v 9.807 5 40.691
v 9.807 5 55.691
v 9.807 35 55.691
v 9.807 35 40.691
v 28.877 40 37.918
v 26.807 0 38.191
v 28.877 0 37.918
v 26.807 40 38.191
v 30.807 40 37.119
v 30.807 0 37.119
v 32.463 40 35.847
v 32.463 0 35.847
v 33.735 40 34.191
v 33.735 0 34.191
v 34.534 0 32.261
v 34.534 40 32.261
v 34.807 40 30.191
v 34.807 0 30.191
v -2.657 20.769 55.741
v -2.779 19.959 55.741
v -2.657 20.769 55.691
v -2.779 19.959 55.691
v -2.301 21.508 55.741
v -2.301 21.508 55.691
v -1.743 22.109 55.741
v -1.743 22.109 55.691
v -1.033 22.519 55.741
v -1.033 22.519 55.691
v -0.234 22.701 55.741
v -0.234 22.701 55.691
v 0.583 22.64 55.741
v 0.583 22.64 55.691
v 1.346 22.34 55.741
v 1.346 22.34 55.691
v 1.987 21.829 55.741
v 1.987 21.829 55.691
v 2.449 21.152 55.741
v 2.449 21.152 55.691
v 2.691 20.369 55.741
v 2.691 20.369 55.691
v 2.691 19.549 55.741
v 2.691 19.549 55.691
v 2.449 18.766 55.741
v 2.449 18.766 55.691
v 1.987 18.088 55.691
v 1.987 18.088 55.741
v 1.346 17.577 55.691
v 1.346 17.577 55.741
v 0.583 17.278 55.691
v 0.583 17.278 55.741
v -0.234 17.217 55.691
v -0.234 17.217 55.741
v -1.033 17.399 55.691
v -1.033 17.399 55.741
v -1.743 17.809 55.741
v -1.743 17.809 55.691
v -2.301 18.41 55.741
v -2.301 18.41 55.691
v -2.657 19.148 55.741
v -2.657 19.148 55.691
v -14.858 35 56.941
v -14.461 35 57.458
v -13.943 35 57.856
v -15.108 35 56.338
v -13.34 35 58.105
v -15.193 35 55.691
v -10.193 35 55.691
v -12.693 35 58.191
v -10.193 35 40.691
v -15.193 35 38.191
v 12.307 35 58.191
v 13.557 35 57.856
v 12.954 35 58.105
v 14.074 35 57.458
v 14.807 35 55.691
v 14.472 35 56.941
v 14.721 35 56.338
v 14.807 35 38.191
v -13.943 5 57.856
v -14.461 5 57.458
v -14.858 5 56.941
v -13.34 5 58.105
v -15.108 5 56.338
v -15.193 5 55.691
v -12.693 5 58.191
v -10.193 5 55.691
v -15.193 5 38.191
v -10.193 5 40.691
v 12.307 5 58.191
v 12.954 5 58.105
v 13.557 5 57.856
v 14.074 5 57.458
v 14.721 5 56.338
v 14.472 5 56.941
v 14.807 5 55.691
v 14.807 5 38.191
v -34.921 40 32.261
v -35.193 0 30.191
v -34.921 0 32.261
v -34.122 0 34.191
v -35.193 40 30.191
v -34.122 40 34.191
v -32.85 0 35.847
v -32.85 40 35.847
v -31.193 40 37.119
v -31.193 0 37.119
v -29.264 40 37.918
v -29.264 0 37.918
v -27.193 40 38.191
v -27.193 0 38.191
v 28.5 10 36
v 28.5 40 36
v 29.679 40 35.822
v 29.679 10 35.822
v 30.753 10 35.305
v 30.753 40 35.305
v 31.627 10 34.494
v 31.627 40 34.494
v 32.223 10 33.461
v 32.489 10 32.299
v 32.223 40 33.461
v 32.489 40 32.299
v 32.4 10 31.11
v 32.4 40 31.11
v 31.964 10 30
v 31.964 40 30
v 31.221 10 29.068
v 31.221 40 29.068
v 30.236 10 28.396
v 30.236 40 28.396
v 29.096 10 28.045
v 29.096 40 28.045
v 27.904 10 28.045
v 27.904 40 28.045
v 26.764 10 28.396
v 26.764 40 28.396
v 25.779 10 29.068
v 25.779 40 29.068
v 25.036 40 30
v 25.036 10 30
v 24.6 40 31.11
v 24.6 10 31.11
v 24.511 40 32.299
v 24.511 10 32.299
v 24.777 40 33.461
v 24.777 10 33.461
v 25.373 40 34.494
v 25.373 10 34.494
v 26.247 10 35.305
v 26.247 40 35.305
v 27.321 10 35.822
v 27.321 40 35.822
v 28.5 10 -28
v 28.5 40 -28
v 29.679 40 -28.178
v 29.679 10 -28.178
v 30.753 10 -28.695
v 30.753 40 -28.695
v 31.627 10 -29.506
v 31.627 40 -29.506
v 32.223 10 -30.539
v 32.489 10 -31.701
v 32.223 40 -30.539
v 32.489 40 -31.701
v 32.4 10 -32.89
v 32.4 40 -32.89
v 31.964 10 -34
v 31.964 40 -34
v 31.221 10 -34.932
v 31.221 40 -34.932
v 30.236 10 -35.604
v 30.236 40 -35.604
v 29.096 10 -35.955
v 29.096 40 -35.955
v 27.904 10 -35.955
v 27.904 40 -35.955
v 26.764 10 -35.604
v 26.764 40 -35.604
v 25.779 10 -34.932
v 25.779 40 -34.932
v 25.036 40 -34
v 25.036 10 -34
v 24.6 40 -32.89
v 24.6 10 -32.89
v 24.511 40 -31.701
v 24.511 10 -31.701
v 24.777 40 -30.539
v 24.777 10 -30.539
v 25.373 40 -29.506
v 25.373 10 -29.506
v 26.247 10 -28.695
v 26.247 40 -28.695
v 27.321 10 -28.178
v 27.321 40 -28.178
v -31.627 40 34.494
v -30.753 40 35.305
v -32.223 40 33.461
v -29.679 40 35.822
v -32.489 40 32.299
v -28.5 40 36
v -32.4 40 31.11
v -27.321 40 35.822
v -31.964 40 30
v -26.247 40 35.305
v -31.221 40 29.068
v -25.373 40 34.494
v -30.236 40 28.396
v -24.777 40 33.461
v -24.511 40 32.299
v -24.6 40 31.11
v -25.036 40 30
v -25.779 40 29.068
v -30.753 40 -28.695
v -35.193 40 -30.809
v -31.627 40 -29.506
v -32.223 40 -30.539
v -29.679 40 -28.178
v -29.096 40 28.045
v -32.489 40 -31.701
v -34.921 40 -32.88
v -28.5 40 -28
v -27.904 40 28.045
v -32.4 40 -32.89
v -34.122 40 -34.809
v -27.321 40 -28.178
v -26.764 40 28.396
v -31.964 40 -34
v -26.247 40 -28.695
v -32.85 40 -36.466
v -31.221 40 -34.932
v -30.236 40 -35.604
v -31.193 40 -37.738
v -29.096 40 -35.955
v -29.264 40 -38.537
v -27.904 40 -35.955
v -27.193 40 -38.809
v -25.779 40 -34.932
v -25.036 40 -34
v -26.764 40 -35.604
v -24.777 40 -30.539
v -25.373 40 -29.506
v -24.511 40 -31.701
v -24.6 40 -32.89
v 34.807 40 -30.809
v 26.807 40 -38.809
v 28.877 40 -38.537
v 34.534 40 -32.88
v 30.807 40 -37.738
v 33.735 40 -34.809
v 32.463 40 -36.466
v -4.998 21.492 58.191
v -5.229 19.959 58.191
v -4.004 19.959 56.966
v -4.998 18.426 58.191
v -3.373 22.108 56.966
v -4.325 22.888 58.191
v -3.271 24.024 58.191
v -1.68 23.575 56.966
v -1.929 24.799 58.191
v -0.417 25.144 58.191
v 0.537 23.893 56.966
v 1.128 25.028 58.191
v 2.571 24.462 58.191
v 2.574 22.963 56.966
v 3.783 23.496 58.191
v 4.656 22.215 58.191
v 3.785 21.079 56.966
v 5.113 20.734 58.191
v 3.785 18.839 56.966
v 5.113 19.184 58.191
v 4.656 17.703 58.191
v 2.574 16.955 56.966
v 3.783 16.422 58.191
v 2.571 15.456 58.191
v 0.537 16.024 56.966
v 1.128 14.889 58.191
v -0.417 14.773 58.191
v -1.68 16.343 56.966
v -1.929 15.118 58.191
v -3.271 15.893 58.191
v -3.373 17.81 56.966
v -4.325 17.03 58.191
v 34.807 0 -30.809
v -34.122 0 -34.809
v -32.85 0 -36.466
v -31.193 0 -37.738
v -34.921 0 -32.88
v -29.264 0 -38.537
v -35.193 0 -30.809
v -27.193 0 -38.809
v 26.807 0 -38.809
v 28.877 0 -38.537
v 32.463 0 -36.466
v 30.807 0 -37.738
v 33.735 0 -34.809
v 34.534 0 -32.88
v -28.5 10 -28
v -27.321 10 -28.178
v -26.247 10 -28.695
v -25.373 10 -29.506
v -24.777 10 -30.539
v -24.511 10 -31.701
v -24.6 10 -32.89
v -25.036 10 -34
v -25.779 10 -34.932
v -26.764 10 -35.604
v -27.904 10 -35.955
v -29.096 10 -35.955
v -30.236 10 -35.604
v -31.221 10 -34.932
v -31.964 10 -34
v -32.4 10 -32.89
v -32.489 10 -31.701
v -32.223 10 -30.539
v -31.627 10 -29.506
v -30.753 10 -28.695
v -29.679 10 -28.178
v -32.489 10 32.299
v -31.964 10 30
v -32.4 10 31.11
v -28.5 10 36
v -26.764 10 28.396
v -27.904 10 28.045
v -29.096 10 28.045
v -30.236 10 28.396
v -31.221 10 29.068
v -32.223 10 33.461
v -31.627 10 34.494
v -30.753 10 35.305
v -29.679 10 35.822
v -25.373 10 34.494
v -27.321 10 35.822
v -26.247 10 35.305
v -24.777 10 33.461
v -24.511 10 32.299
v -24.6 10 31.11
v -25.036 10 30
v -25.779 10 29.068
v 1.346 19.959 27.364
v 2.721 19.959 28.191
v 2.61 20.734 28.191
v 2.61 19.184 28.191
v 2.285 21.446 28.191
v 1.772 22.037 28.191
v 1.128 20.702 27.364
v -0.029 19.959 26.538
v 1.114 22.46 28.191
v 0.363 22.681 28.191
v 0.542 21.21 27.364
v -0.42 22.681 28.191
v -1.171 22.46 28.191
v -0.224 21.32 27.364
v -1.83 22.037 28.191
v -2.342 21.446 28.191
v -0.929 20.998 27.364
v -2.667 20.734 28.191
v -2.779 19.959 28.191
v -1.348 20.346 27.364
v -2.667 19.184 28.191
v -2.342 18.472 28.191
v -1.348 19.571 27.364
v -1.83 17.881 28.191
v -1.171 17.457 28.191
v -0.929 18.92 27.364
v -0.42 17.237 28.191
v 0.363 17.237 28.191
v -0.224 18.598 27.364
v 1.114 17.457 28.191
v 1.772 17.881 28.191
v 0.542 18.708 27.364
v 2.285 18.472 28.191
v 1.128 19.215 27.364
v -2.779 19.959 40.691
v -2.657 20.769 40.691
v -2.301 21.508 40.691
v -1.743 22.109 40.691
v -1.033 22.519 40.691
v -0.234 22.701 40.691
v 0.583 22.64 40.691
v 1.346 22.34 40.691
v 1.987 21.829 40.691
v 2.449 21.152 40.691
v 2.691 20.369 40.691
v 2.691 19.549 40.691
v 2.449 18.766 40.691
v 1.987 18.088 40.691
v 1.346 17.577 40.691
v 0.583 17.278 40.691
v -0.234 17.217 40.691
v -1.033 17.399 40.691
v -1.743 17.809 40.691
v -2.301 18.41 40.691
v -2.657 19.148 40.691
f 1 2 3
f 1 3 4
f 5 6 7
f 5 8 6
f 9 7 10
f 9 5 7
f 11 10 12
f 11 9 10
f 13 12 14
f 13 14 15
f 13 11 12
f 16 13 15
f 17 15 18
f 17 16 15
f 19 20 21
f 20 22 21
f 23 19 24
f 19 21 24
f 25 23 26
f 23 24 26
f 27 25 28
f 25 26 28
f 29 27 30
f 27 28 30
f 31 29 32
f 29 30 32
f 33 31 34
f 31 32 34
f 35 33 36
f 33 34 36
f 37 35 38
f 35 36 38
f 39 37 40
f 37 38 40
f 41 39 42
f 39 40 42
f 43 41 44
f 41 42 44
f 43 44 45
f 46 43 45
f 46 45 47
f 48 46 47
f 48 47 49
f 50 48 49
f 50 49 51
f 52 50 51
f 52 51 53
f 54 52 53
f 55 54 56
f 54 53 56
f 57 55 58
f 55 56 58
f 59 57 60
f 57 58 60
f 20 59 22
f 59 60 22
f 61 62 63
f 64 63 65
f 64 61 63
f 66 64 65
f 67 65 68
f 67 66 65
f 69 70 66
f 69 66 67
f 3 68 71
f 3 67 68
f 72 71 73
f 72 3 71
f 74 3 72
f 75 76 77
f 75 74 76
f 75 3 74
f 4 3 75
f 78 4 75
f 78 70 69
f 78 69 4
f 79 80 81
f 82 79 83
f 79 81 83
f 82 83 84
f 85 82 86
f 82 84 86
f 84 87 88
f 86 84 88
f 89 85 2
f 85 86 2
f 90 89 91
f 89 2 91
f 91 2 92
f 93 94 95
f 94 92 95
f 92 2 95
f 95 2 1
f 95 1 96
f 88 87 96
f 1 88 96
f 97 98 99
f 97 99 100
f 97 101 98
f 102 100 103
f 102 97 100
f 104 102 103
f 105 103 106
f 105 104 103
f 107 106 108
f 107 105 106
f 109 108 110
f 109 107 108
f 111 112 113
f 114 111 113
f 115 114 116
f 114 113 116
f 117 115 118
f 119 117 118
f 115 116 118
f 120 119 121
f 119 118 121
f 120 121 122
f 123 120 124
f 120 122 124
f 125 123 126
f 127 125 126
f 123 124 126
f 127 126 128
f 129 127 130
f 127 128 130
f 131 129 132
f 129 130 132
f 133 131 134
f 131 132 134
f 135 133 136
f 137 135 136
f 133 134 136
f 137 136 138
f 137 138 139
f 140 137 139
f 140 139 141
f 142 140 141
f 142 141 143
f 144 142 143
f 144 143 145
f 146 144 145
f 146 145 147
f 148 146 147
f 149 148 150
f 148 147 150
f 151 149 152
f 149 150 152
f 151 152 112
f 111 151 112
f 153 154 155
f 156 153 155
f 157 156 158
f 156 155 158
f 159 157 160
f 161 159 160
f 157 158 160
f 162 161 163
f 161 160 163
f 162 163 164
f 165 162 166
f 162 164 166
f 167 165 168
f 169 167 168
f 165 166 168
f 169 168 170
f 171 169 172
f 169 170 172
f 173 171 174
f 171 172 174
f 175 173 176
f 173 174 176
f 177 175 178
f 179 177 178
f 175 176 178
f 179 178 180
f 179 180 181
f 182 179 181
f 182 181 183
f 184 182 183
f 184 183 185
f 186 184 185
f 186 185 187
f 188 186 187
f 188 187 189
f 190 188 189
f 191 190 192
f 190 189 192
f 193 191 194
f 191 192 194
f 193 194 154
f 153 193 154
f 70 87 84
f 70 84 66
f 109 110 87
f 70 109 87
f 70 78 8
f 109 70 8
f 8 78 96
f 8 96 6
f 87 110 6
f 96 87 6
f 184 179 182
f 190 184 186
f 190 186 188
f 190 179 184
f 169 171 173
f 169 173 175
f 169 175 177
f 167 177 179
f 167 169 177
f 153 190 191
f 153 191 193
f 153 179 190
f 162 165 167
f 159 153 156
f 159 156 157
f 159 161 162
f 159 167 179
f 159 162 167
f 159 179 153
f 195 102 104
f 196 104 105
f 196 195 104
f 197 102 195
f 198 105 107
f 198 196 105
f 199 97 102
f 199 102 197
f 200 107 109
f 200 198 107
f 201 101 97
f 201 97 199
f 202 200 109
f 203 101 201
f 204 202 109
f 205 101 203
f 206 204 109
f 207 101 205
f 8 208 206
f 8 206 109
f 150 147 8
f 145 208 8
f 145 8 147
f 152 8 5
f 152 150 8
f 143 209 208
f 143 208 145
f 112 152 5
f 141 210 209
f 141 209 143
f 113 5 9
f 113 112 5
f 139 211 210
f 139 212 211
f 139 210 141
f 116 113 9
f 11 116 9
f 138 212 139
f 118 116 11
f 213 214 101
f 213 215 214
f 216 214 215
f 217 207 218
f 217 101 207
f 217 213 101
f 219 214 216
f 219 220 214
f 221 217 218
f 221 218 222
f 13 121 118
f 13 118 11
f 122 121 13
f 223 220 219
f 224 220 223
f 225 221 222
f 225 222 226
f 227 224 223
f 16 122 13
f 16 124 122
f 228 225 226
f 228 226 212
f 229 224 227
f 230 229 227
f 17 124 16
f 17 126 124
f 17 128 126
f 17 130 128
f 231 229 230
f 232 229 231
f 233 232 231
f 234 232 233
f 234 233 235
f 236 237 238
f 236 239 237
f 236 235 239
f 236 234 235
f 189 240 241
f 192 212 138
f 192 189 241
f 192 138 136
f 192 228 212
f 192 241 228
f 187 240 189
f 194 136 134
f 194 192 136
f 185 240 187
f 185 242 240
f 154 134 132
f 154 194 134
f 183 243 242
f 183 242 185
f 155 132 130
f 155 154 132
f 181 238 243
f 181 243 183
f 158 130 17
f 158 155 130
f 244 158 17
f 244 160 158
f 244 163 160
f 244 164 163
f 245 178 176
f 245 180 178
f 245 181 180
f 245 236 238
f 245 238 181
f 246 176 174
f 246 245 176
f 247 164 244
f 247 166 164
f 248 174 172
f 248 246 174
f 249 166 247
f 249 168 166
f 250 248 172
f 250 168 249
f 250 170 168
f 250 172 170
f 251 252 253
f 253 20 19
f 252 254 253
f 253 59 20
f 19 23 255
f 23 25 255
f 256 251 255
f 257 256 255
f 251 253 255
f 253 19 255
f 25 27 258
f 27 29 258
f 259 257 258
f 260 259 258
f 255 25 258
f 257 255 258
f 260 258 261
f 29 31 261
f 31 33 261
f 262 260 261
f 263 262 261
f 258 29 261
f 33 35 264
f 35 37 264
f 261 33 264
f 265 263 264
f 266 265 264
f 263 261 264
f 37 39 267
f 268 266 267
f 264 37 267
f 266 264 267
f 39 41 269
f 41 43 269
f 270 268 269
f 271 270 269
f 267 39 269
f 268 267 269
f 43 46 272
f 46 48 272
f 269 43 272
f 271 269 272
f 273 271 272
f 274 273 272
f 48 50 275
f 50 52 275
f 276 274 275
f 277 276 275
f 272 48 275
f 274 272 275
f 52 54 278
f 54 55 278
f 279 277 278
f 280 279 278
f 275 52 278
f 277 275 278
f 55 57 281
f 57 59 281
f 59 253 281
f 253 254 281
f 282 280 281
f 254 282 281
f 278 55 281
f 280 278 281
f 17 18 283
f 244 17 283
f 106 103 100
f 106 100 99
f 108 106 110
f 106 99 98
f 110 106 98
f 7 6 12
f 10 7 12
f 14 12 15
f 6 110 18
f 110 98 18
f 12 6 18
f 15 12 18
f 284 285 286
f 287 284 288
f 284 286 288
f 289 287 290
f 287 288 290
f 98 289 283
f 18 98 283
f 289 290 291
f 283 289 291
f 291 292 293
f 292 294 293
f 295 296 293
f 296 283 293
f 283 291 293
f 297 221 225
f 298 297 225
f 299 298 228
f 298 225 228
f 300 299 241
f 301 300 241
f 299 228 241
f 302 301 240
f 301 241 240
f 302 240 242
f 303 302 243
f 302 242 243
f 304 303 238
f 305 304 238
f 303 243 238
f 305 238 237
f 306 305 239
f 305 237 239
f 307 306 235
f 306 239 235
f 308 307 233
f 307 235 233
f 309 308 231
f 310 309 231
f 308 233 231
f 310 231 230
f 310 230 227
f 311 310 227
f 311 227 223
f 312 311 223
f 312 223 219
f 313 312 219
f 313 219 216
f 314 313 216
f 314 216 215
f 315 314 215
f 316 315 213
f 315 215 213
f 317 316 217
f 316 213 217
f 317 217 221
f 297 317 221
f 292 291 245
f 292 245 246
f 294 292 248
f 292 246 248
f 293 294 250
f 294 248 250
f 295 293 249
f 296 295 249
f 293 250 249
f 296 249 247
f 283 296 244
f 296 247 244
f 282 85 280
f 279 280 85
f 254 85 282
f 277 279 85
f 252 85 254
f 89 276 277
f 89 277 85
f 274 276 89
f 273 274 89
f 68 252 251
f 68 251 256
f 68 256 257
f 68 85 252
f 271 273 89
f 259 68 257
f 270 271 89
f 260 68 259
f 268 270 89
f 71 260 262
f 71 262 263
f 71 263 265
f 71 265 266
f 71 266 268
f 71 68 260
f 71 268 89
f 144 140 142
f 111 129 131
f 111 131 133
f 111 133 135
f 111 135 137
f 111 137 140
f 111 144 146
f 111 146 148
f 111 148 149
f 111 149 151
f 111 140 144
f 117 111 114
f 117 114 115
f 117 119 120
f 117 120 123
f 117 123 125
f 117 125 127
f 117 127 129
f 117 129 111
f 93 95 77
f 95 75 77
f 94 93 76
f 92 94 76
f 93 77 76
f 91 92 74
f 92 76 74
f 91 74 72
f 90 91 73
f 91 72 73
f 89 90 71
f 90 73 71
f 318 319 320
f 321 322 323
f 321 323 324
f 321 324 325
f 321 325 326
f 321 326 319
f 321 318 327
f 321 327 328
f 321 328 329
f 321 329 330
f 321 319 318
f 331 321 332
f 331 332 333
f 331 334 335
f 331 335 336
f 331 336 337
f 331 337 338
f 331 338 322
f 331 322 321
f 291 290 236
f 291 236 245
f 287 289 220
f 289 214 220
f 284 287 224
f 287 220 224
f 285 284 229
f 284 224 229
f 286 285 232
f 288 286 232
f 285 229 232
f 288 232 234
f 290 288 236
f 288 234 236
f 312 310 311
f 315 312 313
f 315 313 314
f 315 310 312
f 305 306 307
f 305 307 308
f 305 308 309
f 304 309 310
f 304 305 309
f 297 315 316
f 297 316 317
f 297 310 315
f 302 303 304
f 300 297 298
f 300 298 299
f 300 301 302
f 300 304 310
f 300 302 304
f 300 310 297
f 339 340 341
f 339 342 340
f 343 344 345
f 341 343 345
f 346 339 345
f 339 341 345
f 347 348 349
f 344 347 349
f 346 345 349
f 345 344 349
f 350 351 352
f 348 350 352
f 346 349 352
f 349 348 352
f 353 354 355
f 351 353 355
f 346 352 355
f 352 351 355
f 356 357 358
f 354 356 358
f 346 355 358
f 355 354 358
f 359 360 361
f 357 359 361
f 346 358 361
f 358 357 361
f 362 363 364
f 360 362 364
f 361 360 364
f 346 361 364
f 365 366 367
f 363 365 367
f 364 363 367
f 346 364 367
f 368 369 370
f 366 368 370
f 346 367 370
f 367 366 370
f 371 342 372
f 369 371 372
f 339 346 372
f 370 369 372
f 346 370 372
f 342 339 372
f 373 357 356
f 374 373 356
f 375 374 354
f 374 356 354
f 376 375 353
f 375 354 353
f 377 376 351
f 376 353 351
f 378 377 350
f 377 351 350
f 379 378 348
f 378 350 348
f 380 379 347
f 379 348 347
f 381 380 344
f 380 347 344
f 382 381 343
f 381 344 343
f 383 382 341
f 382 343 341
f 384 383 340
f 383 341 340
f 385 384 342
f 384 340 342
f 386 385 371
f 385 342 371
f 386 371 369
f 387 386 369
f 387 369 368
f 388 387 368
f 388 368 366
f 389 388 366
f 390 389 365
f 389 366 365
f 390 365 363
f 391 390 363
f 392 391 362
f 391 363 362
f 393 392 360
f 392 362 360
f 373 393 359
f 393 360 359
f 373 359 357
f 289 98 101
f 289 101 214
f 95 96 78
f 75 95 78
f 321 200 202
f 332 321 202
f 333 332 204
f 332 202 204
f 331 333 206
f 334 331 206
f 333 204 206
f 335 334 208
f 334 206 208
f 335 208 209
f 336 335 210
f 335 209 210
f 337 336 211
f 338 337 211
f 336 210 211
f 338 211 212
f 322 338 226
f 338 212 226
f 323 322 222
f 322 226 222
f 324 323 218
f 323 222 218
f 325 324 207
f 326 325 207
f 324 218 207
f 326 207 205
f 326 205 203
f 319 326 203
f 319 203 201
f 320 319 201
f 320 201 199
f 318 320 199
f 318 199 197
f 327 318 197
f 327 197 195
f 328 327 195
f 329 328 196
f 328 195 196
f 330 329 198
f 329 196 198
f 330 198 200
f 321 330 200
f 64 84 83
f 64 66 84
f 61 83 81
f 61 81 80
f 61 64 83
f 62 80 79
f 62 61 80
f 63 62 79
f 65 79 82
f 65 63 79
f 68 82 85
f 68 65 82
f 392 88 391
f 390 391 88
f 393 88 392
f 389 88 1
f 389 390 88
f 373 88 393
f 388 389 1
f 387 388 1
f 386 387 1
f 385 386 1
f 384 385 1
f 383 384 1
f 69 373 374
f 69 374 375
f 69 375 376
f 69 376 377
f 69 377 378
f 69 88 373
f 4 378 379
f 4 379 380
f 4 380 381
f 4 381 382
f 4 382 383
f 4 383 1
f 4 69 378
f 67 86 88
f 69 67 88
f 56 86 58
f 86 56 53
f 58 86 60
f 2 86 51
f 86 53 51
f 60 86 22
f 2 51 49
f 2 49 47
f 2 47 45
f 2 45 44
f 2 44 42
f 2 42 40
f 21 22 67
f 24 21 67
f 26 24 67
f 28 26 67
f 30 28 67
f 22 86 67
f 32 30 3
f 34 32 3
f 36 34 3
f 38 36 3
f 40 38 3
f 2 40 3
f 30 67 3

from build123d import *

# Parameters (mm, degrees)
SKETCH4_W                                           = 70
SKETCH4_H                                           = 77
BOSS_EXTRUDE1_DEPTH                                 = 40
SKETCH5_R                                           = 4
CUT_EXTRUDE1_DEPTH                                  = 30
SKETCH6_W                                           = 30
SKETCH6_H                                           = 30
BOSS_EXTRUDE3_DEPTH                                 = 20
SKETCH7_W                                           = 20
SKETCH7_H                                           = 15
CUT_EXTRUDE2_DEPTH                                  = 30
CSK_FOR_M5_COUNTERSUNK_FLAT_HEAD_SCREW1_D           = 5.5
CSK_FOR_M5_COUNTERSUNK_FLAT_HEAD_SCREW1_DEPTH       = 30
CSK_FOR_M5_COUNTERSUNK_FLAT_HEAD_SCREW1_CSINK_D     = 10.4
CSK_FOR_M5_COUNTERSUNK_FLAT_HEAD_SCREW1_CSINK_ANGLE = 90
CSK_FOR_M5_COUNTERSUNK_FLAT_HEAD_SCREW1_TIP         = 1.652366702
FILLET1_R                                           = 8
FILLET2_R                                           = 2.5


with BuildPart() as part:
    # Sketch4 → Boss-Extrude1 (new body)
    with BuildSketch(Plane(origin=(0, 0, 0), x_dir=(1, 0, 0), z_dir=(0, 1, 0))):
        with Locations((-0.193370166, 0.309392265)):
            Rectangle(SKETCH4_W, SKETCH4_H)
    extrude(amount=BOSS_EXTRUDE1_DEPTH)

    # Sketch5 → Cut-Extrude1 (cut)
    with BuildSketch(Plane(origin=(0, 40, 0), x_dir=(1, 0, 0), z_dir=(0, 1, 0))):
        with Locations(Location((-28.5, 32, 0), (0, 0, 270))):
            Circle(SKETCH5_R)
        with Locations(Location((28.5, 32, 0), (0, 0, 270))):
            Circle(SKETCH5_R)
        with Locations(Location((-28.5, -32, 0), (0, 0, 270))):
            Circle(SKETCH5_R)
        with Locations(Location((28.5, -32, 0), (0, 0, 270))):
            Circle(SKETCH5_R)
    extrude(amount=-CUT_EXTRUDE1_DEPTH, mode=Mode.SUBTRACT)

    # Sketch6 → Boss-Extrude3 (add)
    with BuildSketch(Plane.XY.offset(38.190607735)):
        with Locations((-0.193370166, 20)):
            Rectangle(SKETCH6_W, SKETCH6_H)
    extrude(amount=BOSS_EXTRUDE3_DEPTH)

    # Sketch7 → Cut-Extrude2 (cut)
    with BuildSketch(Plane(origin=(0, 35, 0), x_dir=(1, 0, 0), z_dir=(0, 1, 0))):
        with Locations((-0.193370166, -48.190607735)):
            Rectangle(SKETCH7_W, SKETCH7_H)
    extrude(amount=-CUT_EXTRUDE2_DEPTH, mode=Mode.SUBTRACT)

    # CSK for M5 Countersunk Flat Head Screw1
    with Locations(Plane.XY.offset(58.190607735)):
        with Locations((-0.028758017, 19.958846963)):
            CounterSinkHole(CSK_FOR_M5_COUNTERSUNK_FLAT_HEAD_SCREW1_D / 2, CSK_FOR_M5_COUNTERSUNK_FLAT_HEAD_SCREW1_CSINK_D / 2, depth=CSK_FOR_M5_COUNTERSUNK_FLAT_HEAD_SCREW1_DEPTH, counter_sink_angle=CSK_FOR_M5_COUNTERSUNK_FLAT_HEAD_SCREW1_CSINK_ANGLE)
            with Locations((0, 0, -(CSK_FOR_M5_COUNTERSUNK_FLAT_HEAD_SCREW1_DEPTH + CSK_FOR_M5_COUNTERSUNK_FLAT_HEAD_SCREW1_TIP / 2))):  # 118° drill point
                Cone(0, CSK_FOR_M5_COUNTERSUNK_FLAT_HEAD_SCREW1_D / 2, CSK_FOR_M5_COUNTERSUNK_FLAT_HEAD_SCREW1_TIP, mode=Mode.SUBTRACT)

    # Fillet1
    fillet1_edges = [part.edges().sort_by_distance(p)[0] for p in [
        (34.806629834, 20, 38.190607735),
        (-35.193370166, 20, 38.190607735),
        (-35.193370166, 20, -38.809392265),
        (34.806629834, 20, -38.809392265),
    ]]
    fillet(fillet1_edges, radius=FILLET1_R)

    # Fillet2
    fillet2_edges = [part.edges().sort_by_distance(p)[0] for p in [
        (-15.193370166, 20, 58.190607735),
        (14.806629834, 20, 58.190607735),
    ]]
    fillet(fillet2_edges, radius=FILLET2_R)


solid = part.part
